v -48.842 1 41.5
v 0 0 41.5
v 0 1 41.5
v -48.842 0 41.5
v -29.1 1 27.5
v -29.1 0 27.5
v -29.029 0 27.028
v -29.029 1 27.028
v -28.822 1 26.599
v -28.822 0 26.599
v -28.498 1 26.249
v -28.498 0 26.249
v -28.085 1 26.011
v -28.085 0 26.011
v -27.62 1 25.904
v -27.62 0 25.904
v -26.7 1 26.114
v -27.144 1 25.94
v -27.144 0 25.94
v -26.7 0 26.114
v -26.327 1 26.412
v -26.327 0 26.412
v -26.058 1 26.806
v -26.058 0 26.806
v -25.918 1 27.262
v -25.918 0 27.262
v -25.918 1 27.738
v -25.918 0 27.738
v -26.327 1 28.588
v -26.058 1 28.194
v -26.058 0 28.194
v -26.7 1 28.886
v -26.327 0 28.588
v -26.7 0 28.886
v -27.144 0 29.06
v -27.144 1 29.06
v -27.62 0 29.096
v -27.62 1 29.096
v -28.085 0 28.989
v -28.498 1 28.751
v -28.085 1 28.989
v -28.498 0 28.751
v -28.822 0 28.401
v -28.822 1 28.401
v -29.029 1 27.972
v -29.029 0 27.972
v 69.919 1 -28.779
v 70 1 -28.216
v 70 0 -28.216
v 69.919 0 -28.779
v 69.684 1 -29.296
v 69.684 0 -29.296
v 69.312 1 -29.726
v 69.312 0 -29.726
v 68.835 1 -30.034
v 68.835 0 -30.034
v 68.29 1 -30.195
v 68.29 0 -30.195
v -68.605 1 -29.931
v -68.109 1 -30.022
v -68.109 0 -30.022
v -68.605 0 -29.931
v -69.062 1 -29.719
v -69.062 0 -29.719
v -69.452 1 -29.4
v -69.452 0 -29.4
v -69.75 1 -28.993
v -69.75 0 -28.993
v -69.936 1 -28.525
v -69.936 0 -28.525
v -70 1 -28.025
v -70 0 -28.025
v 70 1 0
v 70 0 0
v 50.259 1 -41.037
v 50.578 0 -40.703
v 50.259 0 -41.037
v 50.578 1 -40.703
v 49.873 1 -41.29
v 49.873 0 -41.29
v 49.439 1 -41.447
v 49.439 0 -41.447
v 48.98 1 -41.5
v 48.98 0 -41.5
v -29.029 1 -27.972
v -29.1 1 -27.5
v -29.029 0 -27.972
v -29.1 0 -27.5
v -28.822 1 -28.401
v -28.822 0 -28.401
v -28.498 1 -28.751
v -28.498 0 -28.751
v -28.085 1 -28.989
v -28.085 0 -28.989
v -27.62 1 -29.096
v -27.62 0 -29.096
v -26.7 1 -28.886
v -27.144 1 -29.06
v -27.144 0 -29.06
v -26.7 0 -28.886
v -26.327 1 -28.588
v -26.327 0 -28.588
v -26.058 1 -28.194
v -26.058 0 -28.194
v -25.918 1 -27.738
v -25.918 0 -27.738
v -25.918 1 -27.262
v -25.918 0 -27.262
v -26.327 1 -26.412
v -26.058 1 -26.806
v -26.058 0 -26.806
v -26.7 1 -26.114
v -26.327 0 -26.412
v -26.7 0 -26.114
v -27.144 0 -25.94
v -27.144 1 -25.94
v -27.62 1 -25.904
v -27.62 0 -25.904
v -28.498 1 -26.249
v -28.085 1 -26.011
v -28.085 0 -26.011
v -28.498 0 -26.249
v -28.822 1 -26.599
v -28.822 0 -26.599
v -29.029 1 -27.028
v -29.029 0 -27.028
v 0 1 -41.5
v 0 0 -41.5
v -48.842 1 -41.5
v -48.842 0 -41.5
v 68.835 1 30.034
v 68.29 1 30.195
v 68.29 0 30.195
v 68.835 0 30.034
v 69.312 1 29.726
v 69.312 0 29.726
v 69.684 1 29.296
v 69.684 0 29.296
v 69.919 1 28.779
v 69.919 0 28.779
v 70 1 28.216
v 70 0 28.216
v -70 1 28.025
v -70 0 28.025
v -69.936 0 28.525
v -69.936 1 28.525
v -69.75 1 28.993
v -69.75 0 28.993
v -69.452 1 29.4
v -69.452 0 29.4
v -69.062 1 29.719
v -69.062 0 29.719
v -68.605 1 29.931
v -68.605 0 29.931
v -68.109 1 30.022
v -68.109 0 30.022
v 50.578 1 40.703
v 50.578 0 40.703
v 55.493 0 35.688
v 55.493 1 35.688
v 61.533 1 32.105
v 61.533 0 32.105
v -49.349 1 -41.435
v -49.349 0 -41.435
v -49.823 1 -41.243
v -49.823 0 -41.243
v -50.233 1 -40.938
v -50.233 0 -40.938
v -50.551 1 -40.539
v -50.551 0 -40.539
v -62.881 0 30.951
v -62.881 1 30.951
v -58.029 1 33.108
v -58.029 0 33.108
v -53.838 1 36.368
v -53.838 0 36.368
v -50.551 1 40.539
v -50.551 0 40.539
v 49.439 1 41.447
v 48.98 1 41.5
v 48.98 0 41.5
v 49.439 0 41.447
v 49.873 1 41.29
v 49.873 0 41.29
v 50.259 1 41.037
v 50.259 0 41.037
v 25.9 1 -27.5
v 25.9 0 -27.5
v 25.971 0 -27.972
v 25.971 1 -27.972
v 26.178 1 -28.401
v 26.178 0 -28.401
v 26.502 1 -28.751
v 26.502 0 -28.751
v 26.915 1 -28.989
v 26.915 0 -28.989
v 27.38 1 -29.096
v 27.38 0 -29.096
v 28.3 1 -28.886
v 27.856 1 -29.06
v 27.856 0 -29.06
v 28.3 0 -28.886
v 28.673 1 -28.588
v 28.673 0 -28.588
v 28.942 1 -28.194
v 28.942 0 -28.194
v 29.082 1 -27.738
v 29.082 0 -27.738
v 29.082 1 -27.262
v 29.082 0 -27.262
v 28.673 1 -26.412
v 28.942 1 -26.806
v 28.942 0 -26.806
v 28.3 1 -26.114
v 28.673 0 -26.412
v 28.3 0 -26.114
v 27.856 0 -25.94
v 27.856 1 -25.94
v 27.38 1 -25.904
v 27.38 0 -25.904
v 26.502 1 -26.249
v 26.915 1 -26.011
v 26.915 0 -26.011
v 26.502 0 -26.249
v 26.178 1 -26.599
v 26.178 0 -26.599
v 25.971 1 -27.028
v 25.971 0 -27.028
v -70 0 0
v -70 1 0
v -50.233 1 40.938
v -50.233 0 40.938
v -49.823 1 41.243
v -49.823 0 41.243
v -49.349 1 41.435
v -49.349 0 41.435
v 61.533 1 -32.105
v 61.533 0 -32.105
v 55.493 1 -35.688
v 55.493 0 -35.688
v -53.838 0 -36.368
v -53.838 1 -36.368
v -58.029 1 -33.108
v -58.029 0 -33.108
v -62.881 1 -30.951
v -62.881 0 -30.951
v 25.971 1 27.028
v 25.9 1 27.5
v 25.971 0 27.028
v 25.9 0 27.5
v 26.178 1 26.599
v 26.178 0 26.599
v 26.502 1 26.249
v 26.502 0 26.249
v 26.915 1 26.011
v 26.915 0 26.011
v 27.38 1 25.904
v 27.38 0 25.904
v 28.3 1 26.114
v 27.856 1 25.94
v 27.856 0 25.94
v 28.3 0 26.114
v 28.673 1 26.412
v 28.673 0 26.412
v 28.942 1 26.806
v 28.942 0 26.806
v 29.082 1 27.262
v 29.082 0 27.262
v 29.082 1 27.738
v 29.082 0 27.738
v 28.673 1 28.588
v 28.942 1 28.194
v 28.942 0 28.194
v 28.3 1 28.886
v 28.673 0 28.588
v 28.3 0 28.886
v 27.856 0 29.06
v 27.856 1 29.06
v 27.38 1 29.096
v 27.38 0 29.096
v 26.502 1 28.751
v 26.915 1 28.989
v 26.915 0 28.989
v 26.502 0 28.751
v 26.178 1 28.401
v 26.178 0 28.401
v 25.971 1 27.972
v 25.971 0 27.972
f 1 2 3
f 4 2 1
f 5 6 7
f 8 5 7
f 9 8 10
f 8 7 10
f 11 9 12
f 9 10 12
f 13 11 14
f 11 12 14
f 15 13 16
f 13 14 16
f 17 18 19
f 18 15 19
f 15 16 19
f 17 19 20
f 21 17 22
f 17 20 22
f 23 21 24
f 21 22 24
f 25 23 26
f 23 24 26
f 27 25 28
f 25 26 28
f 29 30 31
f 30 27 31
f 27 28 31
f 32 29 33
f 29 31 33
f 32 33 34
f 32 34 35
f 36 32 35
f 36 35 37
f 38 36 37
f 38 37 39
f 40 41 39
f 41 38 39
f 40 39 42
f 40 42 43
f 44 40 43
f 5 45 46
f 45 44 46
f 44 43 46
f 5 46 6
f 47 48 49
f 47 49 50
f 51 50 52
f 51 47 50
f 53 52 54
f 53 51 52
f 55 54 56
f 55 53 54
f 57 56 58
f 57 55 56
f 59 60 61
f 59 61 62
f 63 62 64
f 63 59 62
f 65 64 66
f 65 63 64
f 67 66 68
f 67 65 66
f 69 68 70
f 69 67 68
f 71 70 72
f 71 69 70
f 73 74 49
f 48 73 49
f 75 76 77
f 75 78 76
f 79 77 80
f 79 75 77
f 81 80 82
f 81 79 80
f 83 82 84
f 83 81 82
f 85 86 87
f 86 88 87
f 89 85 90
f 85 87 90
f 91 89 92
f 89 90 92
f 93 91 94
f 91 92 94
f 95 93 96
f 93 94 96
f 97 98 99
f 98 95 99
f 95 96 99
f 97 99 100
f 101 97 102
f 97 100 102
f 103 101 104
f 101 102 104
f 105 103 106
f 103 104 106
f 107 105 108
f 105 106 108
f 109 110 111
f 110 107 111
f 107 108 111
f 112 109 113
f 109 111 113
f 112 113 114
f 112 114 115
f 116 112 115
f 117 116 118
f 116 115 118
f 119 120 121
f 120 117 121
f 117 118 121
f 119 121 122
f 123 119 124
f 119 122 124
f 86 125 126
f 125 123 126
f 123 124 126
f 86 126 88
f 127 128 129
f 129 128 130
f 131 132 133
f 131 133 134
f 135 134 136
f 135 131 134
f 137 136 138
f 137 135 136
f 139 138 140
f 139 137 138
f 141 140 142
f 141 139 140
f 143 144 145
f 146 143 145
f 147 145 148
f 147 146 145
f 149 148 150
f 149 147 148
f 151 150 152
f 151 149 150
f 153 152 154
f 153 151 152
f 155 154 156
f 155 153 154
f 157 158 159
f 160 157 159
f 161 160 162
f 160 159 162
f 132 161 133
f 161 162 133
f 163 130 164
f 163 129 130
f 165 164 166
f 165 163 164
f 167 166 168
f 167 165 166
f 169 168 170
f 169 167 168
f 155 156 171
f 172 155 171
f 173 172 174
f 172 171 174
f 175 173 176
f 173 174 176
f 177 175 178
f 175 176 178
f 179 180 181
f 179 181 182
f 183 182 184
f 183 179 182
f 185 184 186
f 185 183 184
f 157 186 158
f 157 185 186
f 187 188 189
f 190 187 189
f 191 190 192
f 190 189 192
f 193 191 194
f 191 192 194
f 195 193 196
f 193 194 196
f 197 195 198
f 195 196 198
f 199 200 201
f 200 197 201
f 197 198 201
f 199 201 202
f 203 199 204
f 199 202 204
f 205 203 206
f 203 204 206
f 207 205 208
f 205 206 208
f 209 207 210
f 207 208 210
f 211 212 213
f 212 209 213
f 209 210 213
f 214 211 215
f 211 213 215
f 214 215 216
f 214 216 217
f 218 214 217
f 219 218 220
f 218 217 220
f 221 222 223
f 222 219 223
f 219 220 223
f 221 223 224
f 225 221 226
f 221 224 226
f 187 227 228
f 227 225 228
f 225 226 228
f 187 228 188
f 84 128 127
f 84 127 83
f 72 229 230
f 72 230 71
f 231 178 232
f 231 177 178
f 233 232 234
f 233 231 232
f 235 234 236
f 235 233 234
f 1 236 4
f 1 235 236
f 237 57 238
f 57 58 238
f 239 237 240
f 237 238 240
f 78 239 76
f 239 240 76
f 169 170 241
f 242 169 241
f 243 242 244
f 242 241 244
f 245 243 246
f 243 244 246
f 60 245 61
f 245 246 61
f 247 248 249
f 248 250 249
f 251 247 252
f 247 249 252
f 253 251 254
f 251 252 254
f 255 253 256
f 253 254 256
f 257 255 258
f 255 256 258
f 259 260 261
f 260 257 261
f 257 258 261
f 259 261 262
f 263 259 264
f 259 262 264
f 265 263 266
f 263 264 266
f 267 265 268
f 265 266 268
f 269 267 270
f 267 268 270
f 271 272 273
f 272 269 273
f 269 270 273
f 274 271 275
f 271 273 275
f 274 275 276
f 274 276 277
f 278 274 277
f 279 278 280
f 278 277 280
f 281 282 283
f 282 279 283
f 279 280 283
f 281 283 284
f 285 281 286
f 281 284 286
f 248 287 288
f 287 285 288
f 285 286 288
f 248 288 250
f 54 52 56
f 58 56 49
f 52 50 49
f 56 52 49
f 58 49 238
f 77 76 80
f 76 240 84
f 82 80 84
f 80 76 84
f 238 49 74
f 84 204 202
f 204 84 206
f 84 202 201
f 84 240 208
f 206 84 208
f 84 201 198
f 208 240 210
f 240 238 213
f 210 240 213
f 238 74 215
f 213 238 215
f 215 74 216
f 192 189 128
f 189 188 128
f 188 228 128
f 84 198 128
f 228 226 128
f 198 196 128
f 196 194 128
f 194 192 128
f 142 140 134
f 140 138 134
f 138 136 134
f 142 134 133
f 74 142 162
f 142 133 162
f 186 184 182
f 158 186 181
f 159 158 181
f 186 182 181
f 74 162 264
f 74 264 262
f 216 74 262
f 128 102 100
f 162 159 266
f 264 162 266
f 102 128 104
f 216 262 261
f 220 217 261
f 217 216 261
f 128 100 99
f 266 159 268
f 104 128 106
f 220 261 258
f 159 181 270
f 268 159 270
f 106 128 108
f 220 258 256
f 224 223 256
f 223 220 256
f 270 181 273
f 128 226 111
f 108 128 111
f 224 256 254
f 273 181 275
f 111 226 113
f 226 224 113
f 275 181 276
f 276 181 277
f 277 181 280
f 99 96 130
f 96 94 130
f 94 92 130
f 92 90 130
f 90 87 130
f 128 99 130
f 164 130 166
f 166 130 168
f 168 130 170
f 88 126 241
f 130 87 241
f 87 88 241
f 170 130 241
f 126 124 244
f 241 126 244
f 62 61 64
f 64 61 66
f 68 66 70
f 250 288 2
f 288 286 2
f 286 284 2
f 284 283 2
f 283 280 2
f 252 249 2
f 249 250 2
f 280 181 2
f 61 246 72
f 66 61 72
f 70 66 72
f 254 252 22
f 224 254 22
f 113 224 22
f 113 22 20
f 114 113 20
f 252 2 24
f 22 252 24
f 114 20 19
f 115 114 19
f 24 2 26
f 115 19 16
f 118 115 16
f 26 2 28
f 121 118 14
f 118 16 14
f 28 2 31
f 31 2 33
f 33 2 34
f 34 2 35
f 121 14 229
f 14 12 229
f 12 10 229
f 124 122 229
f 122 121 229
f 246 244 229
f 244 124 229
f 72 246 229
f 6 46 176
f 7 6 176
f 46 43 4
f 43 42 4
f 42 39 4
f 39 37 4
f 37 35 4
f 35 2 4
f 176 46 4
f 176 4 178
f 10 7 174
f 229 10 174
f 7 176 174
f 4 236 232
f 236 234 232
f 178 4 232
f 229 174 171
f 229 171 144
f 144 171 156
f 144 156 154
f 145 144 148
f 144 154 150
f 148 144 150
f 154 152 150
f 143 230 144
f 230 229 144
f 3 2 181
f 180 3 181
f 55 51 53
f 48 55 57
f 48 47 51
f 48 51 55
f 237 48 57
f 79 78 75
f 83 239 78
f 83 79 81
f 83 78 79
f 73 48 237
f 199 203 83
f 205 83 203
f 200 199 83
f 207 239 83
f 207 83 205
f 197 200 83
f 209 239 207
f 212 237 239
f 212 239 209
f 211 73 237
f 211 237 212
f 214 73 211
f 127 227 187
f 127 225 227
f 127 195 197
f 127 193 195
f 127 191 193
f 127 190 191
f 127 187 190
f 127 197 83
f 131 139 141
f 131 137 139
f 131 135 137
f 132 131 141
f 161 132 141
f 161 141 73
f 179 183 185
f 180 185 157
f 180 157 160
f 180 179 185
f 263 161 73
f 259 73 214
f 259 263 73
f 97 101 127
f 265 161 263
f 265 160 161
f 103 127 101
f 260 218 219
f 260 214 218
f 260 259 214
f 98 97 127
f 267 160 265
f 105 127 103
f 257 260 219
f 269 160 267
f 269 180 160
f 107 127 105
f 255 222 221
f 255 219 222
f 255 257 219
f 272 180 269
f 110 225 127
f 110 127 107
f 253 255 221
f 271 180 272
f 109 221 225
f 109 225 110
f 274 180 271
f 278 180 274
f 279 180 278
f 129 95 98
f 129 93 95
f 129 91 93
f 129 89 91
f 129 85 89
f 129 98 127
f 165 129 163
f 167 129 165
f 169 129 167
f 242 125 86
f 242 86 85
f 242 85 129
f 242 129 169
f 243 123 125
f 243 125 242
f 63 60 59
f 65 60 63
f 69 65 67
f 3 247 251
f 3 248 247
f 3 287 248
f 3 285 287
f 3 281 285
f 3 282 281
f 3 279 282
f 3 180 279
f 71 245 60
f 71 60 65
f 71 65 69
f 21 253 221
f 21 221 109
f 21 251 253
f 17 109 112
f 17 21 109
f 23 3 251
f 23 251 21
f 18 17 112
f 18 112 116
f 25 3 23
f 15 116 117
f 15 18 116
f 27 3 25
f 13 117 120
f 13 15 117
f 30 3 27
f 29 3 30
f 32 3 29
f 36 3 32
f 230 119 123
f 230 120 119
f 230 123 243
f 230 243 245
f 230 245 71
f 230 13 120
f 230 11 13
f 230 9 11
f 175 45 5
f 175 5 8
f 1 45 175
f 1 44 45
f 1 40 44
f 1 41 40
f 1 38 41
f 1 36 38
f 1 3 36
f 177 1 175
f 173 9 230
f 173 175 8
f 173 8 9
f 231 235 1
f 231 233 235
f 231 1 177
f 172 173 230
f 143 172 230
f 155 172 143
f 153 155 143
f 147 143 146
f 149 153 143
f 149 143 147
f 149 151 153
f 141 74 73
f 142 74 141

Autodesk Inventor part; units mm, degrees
ref_plane "YZ Plane" through (0, 0, 0) normal (1, 0, 0) x (0, 1, 0)
ref_plane "XZ Plane" through (0, 0, 0) normal (0, 1, 0) x (-1, 0, 0)
ref_plane "XY Plane" through (0, 0, 0) normal (0, 0, 1) x (1, 0, 0)
sketch "Sketch3" plane through (0, 0, 0) normal (0, 1, 0) x (-1, 0, 0)
  line L0 (-27.5, -27.5) -> (27.5, -27.5) construction
  line L1 (27.5, -27.5) -> (27.5, 27.5) construction
  line L2 (27.5, 27.5) -> (-27.5, 27.5) construction
  line L3 (-27.5, 27.5) -> (-27.5, -27.5) construction
  line L4 (-27.5, -27.5) -> (27.5, 27.5) construction
  line L5 (27.5, -27.5) -> (-27.5, 27.5) construction
  circle A0 centre (-27.5, 27.5) radius 1.6
  circle A1 centre (27.5, 27.5) radius 1.6
  circle A2 centre (-27.5, -27.5) radius 1.6
  circle A3 centre (27.5, -27.5) radius 1.6
  circle A4 centre (-67.1751, -42.4264) radius 1.6 construction
  line L6 (-27.5, -27.5) -> (-67.1751, -42.4264) construction
  line L7 (-30, -25.7695) -> (-68.0554, -40.0865) construction
  line L8 (-66.2948, -44.7663) -> (-27.0453, -30) construction
  arc A5 (-68.0554, -40.0865) -> (-66.2948, -44.7663) centre (-67.1751, -42.4264) ccw construction
  circle A6 centre (67.1751, -42.4264) radius 1.6 construction
  line L9 (27.5, -27.5) -> (67.1751, -42.4264) construction
  line L10 (27.0453, -30) -> (66.2948, -44.7663) construction
  line L11 (68.0554, -40.0865) -> (30, -25.7695) construction
  arc A7 (66.2948, -44.7663) -> (68.0554, -40.0865) centre (67.1751, -42.4264) ccw construction
  line L12 (27.5, -27.5) -> (-27.5, -27.5) construction
  line L13 (25, -25) -> (-25, -25) construction
  line L14 (-27.0453, -30) -> (27.0453, -30) construction
  line L15 (-27.5, -27.5) -> (-27.5, 27.5) construction
  line L16 (-25, -25) -> (-25, 25) construction
  line L17 (-30, 25.7695) -> (-30, -25.7695) construction
  circle A8 centre (-67.1751, 42.4264) radius 1.6 construction
  line L18 (-27.5, 27.5) -> (-67.1751, 42.4264) construction
  line L19 (-27.0453, 30) -> (-66.2948, 44.7663) construction
  line L20 (-68.0554, 40.0865) -> (-30, 25.7695) construction
  arc A9 (-66.2948, 44.7663) -> (-68.0554, 40.0865) centre (-67.1751, 42.4264) ccw construction
  line L21 (-27.5, 27.5) -> (27.5, 27.5) construction
  line L22 (-25, 25) -> (25, 25) construction
  line L23 (27.0453, 30) -> (-27.0453, 30) construction
  circle A10 centre (67.1751, 42.4264) radius 1.6 construction
  line L24 (27.5, 27.5) -> (67.1751, 42.4264) construction
  line L25 (34.5998, 27.5) -> (68.0554, 40.0865) construction
  line L26 (66.2948, 44.7663) -> (27.0453, 30) construction
  arc A11 (68.0554, 40.0865) -> (66.2948, 44.7663) centre (67.1751, 42.4264) ccw construction
  line L27 (27.5, -27.5) -> (27.5, 27.5) construction
  line L28 (30, -25.7695) -> (30, 25.7695) construction
  line L29 (25, 25) -> (25, -25) construction
  line L30 (34.5998, 27.5) -> (30, 25.7695) construction
  line L31 (55, 55) -> (-55, -55) construction
  line L32 (-55, 55) -> (55, -55) construction
  circle A12 centre (0, 0) radius 110 construction
  arc A13 (43.0581, -98.5) -> (-43.0581, -98.5) centre (0, 0) ccw construction
  line L33 (0, -107.5) -> (0, -98.5) construction
  line L34 (0, -98.5) -> (0, -73.5) construction
  line L35 (0, -98.5) -> (-43.0581, -98.5) construction
  line L36 (0, -98.5) -> (43.0581, -98.5) construction
  line L37 (43.0581, -98.5) -> (-43.0581, -98.5) construction
  line L38 (-18.0581, -73.5) -> (18.0581, -73.5) construction
  arc A14 (43.0581, -98.5) -> (18.0581, -73.5) centre (18.0581, -98.5) ccw construction
  arc A15 (-18.0581, -73.5) -> (-43.0581, -98.5) centre (-18.0581, -98.5) ccw construction
  line L39 (0, 107.5) -> (0, 97.5) construction
  line L40 (0, 97.5) -> (-22.5, 97.5) construction
  line L41 (-22.5, 97.5) -> (-22.5, 82.5) construction
  line L42 (22.5, 82.5) -> (22.5, 97.5) construction
  line L43 (22.5, 90) -> (-22.5, 90) construction
  line L44 (15, 97.5) -> (-15, 97.5)
  line L45 (-15, 82.5) -> (15, 82.5)
  arc A16 (15, 82.5) -> (15, 97.5) centre (15, 90) ccw
  arc A17 (-15, 97.5) -> (-15, 82.5) centre (-15, 90) ccw
  line L46 (22.5, 82.5) -> (17.5, 82.5) construction
  line L47 (17.5, 82.5) -> (17.5, 77.5) construction
  circle A18 centre (17.5, 77.5) radius 1.6
  circle A19 centre (-17.5, 77.5) radius 1.6
  line L48 (-58.3363, 79.5495) -> (-79.5495, 58.3363) construction
  arc A20 (-47.7297, 68.9429) -> (-58.3363, 79.5495) centre (-53.033, 74.2462) ccw construction
  arc A21 (-79.5495, 58.3363) -> (-68.9429, 47.7297) centre (-74.2462, 53.033) ccw construction
  line L49 (-68.9429, 47.7297) -> (-47.7297, 68.9429) construction
  circle A22 centre (-67.1751, 42.4264) radius 1.6 construction
  circle A23 centre (-42.4264, 67.1751) radius 1.6 construction
  line L50 (-97.5, 15) -> (-97.5, -15)
  arc A24 (-82.5, 15) -> (-97.5, 15) centre (-90, 15) ccw
  arc A25 (-97.5, -15) -> (-82.5, -15) centre (-90, -15) ccw
  line L51 (-82.5, -15) -> (-82.5, 15)
  circle A26 centre (-77.5, -17.5) radius 1.6
  circle A27 centre (-77.5, 17.5) radius 1.6
  line L52 (-79.5495, -58.3363) -> (-58.3363, -79.5495) construction
  arc A28 (-68.9429, -47.7297) -> (-79.5495, -58.3363) centre (-74.2462, -53.033) ccw construction
  arc A29 (-58.3363, -79.5495) -> (-47.7297, -68.9429) centre (-53.033, -74.2462) ccw construction
  line L53 (-47.7297, -68.9429) -> (-68.9429, -47.7297) construction
  circle A30 centre (-42.4264, -67.1751) radius 1.6 construction
  circle A31 centre (-67.1751, -42.4264) radius 1.6 construction
  line L54 (-15, -97.5) -> (15, -97.5)
  arc A32 (-15, -82.5) -> (-15, -97.5) centre (-15, -90) ccw
  arc A33 (15, -97.5) -> (15, -82.5) centre (15, -90) ccw
  line L55 (15, -82.5) -> (-15, -82.5)
  circle A34 centre (17.5, -77.5) radius 1.6
  circle A35 centre (-17.5, -77.5) radius 1.6
  line L56 (58.3363, -79.5495) -> (79.5495, -58.3363) construction
  arc A36 (47.7297, -68.9429) -> (58.3363, -79.5495) centre (53.033, -74.2462) ccw construction
  arc A37 (79.5495, -58.3363) -> (68.9429, -47.7297) centre (74.2462, -53.033) ccw construction
  line L57 (68.9429, -47.7297) -> (47.7297, -68.9429) construction
  circle A38 centre (67.1751, -42.4264) radius 1.6 construction
  circle A39 centre (42.4264, -67.1751) radius 1.6 construction
  line L58 (97.5, -15) -> (97.5, 15)
  arc A40 (82.5, -15) -> (97.5, -15) centre (90, -15) ccw
  arc A41 (97.5, 15) -> (82.5, 15) centre (90, 15) ccw
  line L59 (82.5, 15) -> (82.5, -15)
  circle A42 centre (77.5, 17.5) radius 1.6
  circle A43 centre (77.5, -17.5) radius 1.6
  line L60 (79.5495, 58.3363) -> (58.3363, 79.5495) construction
  arc A44 (68.9429, 47.7297) -> (79.5495, 58.3363) centre (74.2462, 53.033) ccw construction
  arc A45 (58.3363, 79.5495) -> (47.7297, 68.9429) centre (53.033, 74.2462) ccw construction
  line L61 (47.7297, 68.9429) -> (68.9429, 47.7297) construction
  circle A46 centre (42.4264, 67.1751) radius 1.6 construction
  circle A47 centre (67.1751, 42.4264) radius 1.6 construction
  line L62 (58.3363, -58.3363) -> (51.2652, -51.2652) construction
  line L63 (40.6586, -61.8718) -> (61.8718, -40.6586) construction
  arc A48 (40.6586, -61.8718) -> (44.5267, -89.5398) centre (53.033, -74.2462) ccw construction
  arc A49 (89.5398, -44.5267) -> (61.8718, -40.6586) centre (74.2462, -53.033) ccw construction
  line L64 (0, -73.5) -> (0, -66.5) construction
  arc A50 (44.5267, 89.5398) -> (40.6586, 61.8718) centre (53.033, 74.2462) ccw construction
  line L65 (61.8718, 40.6586) -> (40.6586, 61.8718) construction
  arc A51 (61.8718, 40.6586) -> (89.5398, 44.5267) centre (74.2462, 53.033) ccw construction
  arc A52 (-89.5398, 44.5267) -> (-61.8718, 40.6586) centre (-74.2462, 53.033) ccw construction
  line L66 (-40.6586, 61.8718) -> (-61.8718, 40.6586) construction
  arc A53 (-40.6586, 61.8718) -> (-44.5267, 89.5398) centre (-53.033, 74.2462) ccw construction
  arc A54 (-44.5267, -89.5398) -> (-40.6586, -61.8718) centre (-53.033, -74.2462) ccw construction
  line L67 (-61.8718, -40.6586) -> (-40.6586, -61.8718) construction
  arc A55 (-61.8718, -40.6586) -> (-89.5398, -44.5267) centre (-74.2462, -53.033) ccw construction
  arc A56 (89.5398, -44.5267) -> (89.5398, 44.5267) centre (0, 0) ccw construction
  arc A57 (44.5267, 89.5398) -> (-44.5267, 89.5398) centre (0, 0) ccw construction
  arc A58 (-89.5398, 44.5267) -> (-89.5398, -44.5267) centre (0, 0) ccw construction
  line L68 (43.0581, -98.5) -> (48.0581, -98.5) construction
  line L69 (48.0581, -98.5) -> (48.0581, -88.5) construction
  circle A59 centre (48.0581, -88.5) radius 1.6 construction
  circle A60 centre (-48.0581, -88.5) radius 1.6 construction
  line L70 (18.0581, -66.5) -> (-18.0581, -66.5) construction
  arc A61 (17.5, -66.5) -> (43.0581, -59.4724) centre (19.5145, -23.8377) ccw construction
  arc A62 (-44.5267, -58.0038) -> (-18.0581, -66.5) centre (-19.5089, -25.5422) ccw construction
  line L71 (0, -66.5) -> (0, -41.5) construction
  line L72 (0, -41.5) -> (50, -41.5)
  line L73 (0, -41.5) -> (-50, -41.5)
  line L74 (107.5, 0) -> (70, 0) construction
  line L75 (70, 0) -> (70, -30)
  line L76 (70, 0) -> (70, 30)
  line L77 (-70, 0) -> (-70, -30)
  line L78 (-70, 0) -> (-70, 30)
  arc A63 (70, -30) -> (50, -41.5) centre (69.3076, -51.9372) ccw
  arc A64 (-50, -41.5) -> (-70, -30) centre (-72.2179, -56.9986) ccw
  line L79 (0, 0) -> (15.9, 0) construction
  line L80 (0, 41.5) -> (50, 41.5)
  line L81 (0, 41.5) -> (-50, 41.5)
  arc A65 (50, 41.5) -> (70, 30) centre (69.3076, 51.9372) ccw
  arc A66 (-70, 30) -> (-50, 41.5) centre (-72.2179, 56.9986) ccw
  point P0 (-47.3376, -34.9632)
  point P1 (47.3376, -34.9632)
  point P2 (0, -27.5)
  point P3 (-27.5, 0)
  point P4 (-47.3376, 34.9632)
  point P5 (0, 27.5)
  point P6 (47.3376, 34.9632)
  point P7 (27.5, 0)
  point P8 (0, 90)
  point P9 (-45.9619, 70.7107)
  point P10 (-82.5, 17.5)
  point P11 (-70.7107, -45.9619)
  point P12 (-17.5, -82.5)
  point P13 (45.9619, -70.7107)
  point P14 (82.5, -17.5)
  point P15 (70.7107, 45.9619)
  point P16 (35.7159, -76.7698)
  dimension "d50" = 55
  dimension "d51" = 55
  dimension "d52" = 3.2
  dimension "d53" = 3.2
  dimension "d54" = 3.2
  dimension "d55" = 3.2
  dimension "d56" = 5
  dimension "d57" = 5
  dimension "d58" = 5
  dimension "d59" = 5
  dimension "d60" = 110
  dimension "d67" = 220
  dimension "d68" = 215
  dimension "d69" = 9
  dimension "d70" = 25
  dimension "d71" = 10
  dimension "d72" = 22.5
  dimension "d73" = 15
  dimension "d74" = 45
  dimension "d75" = 5
  dimension "d76" = 5
  dimension "d77" = 3.2
  dimension "d78" = 86.1162
  dimension "d79" = 45
  dimension "d80" = 360
  dimension "d81" = 10
  dimension "d82" = 7
  dimension "d83" = 360
  dimension "d84" = 5
  dimension "d85" = 10
  dimension "d86" = 3.2
  dimension "d87" = 25
  dimension "d88" = 50
  dimension "d89" = 50
  dimension "d90" = 37.5
  dimension "d91" = 30
  dimension "d92" = 30
extrude "Extrusion3" add sketch "Sketch3" along normal blind 1 contours L73 A64 L77 L78 A66 L81 L80 A65 L76 L75 A63 L72
fillet "Fillet1" radius 2 8 edges at (50, 0.5, 41.5) (70, 0.5, 30) (70, 0.5, -30) (50, 0.5, -41.5) (-50, 0.5, 41.5) (-70, 0.5, 30) (-70, 0.5, -30) (-50, 0.5, -41.5)
properties part number "Infrared&ControllerPCB" material "Aluminum 6061"
